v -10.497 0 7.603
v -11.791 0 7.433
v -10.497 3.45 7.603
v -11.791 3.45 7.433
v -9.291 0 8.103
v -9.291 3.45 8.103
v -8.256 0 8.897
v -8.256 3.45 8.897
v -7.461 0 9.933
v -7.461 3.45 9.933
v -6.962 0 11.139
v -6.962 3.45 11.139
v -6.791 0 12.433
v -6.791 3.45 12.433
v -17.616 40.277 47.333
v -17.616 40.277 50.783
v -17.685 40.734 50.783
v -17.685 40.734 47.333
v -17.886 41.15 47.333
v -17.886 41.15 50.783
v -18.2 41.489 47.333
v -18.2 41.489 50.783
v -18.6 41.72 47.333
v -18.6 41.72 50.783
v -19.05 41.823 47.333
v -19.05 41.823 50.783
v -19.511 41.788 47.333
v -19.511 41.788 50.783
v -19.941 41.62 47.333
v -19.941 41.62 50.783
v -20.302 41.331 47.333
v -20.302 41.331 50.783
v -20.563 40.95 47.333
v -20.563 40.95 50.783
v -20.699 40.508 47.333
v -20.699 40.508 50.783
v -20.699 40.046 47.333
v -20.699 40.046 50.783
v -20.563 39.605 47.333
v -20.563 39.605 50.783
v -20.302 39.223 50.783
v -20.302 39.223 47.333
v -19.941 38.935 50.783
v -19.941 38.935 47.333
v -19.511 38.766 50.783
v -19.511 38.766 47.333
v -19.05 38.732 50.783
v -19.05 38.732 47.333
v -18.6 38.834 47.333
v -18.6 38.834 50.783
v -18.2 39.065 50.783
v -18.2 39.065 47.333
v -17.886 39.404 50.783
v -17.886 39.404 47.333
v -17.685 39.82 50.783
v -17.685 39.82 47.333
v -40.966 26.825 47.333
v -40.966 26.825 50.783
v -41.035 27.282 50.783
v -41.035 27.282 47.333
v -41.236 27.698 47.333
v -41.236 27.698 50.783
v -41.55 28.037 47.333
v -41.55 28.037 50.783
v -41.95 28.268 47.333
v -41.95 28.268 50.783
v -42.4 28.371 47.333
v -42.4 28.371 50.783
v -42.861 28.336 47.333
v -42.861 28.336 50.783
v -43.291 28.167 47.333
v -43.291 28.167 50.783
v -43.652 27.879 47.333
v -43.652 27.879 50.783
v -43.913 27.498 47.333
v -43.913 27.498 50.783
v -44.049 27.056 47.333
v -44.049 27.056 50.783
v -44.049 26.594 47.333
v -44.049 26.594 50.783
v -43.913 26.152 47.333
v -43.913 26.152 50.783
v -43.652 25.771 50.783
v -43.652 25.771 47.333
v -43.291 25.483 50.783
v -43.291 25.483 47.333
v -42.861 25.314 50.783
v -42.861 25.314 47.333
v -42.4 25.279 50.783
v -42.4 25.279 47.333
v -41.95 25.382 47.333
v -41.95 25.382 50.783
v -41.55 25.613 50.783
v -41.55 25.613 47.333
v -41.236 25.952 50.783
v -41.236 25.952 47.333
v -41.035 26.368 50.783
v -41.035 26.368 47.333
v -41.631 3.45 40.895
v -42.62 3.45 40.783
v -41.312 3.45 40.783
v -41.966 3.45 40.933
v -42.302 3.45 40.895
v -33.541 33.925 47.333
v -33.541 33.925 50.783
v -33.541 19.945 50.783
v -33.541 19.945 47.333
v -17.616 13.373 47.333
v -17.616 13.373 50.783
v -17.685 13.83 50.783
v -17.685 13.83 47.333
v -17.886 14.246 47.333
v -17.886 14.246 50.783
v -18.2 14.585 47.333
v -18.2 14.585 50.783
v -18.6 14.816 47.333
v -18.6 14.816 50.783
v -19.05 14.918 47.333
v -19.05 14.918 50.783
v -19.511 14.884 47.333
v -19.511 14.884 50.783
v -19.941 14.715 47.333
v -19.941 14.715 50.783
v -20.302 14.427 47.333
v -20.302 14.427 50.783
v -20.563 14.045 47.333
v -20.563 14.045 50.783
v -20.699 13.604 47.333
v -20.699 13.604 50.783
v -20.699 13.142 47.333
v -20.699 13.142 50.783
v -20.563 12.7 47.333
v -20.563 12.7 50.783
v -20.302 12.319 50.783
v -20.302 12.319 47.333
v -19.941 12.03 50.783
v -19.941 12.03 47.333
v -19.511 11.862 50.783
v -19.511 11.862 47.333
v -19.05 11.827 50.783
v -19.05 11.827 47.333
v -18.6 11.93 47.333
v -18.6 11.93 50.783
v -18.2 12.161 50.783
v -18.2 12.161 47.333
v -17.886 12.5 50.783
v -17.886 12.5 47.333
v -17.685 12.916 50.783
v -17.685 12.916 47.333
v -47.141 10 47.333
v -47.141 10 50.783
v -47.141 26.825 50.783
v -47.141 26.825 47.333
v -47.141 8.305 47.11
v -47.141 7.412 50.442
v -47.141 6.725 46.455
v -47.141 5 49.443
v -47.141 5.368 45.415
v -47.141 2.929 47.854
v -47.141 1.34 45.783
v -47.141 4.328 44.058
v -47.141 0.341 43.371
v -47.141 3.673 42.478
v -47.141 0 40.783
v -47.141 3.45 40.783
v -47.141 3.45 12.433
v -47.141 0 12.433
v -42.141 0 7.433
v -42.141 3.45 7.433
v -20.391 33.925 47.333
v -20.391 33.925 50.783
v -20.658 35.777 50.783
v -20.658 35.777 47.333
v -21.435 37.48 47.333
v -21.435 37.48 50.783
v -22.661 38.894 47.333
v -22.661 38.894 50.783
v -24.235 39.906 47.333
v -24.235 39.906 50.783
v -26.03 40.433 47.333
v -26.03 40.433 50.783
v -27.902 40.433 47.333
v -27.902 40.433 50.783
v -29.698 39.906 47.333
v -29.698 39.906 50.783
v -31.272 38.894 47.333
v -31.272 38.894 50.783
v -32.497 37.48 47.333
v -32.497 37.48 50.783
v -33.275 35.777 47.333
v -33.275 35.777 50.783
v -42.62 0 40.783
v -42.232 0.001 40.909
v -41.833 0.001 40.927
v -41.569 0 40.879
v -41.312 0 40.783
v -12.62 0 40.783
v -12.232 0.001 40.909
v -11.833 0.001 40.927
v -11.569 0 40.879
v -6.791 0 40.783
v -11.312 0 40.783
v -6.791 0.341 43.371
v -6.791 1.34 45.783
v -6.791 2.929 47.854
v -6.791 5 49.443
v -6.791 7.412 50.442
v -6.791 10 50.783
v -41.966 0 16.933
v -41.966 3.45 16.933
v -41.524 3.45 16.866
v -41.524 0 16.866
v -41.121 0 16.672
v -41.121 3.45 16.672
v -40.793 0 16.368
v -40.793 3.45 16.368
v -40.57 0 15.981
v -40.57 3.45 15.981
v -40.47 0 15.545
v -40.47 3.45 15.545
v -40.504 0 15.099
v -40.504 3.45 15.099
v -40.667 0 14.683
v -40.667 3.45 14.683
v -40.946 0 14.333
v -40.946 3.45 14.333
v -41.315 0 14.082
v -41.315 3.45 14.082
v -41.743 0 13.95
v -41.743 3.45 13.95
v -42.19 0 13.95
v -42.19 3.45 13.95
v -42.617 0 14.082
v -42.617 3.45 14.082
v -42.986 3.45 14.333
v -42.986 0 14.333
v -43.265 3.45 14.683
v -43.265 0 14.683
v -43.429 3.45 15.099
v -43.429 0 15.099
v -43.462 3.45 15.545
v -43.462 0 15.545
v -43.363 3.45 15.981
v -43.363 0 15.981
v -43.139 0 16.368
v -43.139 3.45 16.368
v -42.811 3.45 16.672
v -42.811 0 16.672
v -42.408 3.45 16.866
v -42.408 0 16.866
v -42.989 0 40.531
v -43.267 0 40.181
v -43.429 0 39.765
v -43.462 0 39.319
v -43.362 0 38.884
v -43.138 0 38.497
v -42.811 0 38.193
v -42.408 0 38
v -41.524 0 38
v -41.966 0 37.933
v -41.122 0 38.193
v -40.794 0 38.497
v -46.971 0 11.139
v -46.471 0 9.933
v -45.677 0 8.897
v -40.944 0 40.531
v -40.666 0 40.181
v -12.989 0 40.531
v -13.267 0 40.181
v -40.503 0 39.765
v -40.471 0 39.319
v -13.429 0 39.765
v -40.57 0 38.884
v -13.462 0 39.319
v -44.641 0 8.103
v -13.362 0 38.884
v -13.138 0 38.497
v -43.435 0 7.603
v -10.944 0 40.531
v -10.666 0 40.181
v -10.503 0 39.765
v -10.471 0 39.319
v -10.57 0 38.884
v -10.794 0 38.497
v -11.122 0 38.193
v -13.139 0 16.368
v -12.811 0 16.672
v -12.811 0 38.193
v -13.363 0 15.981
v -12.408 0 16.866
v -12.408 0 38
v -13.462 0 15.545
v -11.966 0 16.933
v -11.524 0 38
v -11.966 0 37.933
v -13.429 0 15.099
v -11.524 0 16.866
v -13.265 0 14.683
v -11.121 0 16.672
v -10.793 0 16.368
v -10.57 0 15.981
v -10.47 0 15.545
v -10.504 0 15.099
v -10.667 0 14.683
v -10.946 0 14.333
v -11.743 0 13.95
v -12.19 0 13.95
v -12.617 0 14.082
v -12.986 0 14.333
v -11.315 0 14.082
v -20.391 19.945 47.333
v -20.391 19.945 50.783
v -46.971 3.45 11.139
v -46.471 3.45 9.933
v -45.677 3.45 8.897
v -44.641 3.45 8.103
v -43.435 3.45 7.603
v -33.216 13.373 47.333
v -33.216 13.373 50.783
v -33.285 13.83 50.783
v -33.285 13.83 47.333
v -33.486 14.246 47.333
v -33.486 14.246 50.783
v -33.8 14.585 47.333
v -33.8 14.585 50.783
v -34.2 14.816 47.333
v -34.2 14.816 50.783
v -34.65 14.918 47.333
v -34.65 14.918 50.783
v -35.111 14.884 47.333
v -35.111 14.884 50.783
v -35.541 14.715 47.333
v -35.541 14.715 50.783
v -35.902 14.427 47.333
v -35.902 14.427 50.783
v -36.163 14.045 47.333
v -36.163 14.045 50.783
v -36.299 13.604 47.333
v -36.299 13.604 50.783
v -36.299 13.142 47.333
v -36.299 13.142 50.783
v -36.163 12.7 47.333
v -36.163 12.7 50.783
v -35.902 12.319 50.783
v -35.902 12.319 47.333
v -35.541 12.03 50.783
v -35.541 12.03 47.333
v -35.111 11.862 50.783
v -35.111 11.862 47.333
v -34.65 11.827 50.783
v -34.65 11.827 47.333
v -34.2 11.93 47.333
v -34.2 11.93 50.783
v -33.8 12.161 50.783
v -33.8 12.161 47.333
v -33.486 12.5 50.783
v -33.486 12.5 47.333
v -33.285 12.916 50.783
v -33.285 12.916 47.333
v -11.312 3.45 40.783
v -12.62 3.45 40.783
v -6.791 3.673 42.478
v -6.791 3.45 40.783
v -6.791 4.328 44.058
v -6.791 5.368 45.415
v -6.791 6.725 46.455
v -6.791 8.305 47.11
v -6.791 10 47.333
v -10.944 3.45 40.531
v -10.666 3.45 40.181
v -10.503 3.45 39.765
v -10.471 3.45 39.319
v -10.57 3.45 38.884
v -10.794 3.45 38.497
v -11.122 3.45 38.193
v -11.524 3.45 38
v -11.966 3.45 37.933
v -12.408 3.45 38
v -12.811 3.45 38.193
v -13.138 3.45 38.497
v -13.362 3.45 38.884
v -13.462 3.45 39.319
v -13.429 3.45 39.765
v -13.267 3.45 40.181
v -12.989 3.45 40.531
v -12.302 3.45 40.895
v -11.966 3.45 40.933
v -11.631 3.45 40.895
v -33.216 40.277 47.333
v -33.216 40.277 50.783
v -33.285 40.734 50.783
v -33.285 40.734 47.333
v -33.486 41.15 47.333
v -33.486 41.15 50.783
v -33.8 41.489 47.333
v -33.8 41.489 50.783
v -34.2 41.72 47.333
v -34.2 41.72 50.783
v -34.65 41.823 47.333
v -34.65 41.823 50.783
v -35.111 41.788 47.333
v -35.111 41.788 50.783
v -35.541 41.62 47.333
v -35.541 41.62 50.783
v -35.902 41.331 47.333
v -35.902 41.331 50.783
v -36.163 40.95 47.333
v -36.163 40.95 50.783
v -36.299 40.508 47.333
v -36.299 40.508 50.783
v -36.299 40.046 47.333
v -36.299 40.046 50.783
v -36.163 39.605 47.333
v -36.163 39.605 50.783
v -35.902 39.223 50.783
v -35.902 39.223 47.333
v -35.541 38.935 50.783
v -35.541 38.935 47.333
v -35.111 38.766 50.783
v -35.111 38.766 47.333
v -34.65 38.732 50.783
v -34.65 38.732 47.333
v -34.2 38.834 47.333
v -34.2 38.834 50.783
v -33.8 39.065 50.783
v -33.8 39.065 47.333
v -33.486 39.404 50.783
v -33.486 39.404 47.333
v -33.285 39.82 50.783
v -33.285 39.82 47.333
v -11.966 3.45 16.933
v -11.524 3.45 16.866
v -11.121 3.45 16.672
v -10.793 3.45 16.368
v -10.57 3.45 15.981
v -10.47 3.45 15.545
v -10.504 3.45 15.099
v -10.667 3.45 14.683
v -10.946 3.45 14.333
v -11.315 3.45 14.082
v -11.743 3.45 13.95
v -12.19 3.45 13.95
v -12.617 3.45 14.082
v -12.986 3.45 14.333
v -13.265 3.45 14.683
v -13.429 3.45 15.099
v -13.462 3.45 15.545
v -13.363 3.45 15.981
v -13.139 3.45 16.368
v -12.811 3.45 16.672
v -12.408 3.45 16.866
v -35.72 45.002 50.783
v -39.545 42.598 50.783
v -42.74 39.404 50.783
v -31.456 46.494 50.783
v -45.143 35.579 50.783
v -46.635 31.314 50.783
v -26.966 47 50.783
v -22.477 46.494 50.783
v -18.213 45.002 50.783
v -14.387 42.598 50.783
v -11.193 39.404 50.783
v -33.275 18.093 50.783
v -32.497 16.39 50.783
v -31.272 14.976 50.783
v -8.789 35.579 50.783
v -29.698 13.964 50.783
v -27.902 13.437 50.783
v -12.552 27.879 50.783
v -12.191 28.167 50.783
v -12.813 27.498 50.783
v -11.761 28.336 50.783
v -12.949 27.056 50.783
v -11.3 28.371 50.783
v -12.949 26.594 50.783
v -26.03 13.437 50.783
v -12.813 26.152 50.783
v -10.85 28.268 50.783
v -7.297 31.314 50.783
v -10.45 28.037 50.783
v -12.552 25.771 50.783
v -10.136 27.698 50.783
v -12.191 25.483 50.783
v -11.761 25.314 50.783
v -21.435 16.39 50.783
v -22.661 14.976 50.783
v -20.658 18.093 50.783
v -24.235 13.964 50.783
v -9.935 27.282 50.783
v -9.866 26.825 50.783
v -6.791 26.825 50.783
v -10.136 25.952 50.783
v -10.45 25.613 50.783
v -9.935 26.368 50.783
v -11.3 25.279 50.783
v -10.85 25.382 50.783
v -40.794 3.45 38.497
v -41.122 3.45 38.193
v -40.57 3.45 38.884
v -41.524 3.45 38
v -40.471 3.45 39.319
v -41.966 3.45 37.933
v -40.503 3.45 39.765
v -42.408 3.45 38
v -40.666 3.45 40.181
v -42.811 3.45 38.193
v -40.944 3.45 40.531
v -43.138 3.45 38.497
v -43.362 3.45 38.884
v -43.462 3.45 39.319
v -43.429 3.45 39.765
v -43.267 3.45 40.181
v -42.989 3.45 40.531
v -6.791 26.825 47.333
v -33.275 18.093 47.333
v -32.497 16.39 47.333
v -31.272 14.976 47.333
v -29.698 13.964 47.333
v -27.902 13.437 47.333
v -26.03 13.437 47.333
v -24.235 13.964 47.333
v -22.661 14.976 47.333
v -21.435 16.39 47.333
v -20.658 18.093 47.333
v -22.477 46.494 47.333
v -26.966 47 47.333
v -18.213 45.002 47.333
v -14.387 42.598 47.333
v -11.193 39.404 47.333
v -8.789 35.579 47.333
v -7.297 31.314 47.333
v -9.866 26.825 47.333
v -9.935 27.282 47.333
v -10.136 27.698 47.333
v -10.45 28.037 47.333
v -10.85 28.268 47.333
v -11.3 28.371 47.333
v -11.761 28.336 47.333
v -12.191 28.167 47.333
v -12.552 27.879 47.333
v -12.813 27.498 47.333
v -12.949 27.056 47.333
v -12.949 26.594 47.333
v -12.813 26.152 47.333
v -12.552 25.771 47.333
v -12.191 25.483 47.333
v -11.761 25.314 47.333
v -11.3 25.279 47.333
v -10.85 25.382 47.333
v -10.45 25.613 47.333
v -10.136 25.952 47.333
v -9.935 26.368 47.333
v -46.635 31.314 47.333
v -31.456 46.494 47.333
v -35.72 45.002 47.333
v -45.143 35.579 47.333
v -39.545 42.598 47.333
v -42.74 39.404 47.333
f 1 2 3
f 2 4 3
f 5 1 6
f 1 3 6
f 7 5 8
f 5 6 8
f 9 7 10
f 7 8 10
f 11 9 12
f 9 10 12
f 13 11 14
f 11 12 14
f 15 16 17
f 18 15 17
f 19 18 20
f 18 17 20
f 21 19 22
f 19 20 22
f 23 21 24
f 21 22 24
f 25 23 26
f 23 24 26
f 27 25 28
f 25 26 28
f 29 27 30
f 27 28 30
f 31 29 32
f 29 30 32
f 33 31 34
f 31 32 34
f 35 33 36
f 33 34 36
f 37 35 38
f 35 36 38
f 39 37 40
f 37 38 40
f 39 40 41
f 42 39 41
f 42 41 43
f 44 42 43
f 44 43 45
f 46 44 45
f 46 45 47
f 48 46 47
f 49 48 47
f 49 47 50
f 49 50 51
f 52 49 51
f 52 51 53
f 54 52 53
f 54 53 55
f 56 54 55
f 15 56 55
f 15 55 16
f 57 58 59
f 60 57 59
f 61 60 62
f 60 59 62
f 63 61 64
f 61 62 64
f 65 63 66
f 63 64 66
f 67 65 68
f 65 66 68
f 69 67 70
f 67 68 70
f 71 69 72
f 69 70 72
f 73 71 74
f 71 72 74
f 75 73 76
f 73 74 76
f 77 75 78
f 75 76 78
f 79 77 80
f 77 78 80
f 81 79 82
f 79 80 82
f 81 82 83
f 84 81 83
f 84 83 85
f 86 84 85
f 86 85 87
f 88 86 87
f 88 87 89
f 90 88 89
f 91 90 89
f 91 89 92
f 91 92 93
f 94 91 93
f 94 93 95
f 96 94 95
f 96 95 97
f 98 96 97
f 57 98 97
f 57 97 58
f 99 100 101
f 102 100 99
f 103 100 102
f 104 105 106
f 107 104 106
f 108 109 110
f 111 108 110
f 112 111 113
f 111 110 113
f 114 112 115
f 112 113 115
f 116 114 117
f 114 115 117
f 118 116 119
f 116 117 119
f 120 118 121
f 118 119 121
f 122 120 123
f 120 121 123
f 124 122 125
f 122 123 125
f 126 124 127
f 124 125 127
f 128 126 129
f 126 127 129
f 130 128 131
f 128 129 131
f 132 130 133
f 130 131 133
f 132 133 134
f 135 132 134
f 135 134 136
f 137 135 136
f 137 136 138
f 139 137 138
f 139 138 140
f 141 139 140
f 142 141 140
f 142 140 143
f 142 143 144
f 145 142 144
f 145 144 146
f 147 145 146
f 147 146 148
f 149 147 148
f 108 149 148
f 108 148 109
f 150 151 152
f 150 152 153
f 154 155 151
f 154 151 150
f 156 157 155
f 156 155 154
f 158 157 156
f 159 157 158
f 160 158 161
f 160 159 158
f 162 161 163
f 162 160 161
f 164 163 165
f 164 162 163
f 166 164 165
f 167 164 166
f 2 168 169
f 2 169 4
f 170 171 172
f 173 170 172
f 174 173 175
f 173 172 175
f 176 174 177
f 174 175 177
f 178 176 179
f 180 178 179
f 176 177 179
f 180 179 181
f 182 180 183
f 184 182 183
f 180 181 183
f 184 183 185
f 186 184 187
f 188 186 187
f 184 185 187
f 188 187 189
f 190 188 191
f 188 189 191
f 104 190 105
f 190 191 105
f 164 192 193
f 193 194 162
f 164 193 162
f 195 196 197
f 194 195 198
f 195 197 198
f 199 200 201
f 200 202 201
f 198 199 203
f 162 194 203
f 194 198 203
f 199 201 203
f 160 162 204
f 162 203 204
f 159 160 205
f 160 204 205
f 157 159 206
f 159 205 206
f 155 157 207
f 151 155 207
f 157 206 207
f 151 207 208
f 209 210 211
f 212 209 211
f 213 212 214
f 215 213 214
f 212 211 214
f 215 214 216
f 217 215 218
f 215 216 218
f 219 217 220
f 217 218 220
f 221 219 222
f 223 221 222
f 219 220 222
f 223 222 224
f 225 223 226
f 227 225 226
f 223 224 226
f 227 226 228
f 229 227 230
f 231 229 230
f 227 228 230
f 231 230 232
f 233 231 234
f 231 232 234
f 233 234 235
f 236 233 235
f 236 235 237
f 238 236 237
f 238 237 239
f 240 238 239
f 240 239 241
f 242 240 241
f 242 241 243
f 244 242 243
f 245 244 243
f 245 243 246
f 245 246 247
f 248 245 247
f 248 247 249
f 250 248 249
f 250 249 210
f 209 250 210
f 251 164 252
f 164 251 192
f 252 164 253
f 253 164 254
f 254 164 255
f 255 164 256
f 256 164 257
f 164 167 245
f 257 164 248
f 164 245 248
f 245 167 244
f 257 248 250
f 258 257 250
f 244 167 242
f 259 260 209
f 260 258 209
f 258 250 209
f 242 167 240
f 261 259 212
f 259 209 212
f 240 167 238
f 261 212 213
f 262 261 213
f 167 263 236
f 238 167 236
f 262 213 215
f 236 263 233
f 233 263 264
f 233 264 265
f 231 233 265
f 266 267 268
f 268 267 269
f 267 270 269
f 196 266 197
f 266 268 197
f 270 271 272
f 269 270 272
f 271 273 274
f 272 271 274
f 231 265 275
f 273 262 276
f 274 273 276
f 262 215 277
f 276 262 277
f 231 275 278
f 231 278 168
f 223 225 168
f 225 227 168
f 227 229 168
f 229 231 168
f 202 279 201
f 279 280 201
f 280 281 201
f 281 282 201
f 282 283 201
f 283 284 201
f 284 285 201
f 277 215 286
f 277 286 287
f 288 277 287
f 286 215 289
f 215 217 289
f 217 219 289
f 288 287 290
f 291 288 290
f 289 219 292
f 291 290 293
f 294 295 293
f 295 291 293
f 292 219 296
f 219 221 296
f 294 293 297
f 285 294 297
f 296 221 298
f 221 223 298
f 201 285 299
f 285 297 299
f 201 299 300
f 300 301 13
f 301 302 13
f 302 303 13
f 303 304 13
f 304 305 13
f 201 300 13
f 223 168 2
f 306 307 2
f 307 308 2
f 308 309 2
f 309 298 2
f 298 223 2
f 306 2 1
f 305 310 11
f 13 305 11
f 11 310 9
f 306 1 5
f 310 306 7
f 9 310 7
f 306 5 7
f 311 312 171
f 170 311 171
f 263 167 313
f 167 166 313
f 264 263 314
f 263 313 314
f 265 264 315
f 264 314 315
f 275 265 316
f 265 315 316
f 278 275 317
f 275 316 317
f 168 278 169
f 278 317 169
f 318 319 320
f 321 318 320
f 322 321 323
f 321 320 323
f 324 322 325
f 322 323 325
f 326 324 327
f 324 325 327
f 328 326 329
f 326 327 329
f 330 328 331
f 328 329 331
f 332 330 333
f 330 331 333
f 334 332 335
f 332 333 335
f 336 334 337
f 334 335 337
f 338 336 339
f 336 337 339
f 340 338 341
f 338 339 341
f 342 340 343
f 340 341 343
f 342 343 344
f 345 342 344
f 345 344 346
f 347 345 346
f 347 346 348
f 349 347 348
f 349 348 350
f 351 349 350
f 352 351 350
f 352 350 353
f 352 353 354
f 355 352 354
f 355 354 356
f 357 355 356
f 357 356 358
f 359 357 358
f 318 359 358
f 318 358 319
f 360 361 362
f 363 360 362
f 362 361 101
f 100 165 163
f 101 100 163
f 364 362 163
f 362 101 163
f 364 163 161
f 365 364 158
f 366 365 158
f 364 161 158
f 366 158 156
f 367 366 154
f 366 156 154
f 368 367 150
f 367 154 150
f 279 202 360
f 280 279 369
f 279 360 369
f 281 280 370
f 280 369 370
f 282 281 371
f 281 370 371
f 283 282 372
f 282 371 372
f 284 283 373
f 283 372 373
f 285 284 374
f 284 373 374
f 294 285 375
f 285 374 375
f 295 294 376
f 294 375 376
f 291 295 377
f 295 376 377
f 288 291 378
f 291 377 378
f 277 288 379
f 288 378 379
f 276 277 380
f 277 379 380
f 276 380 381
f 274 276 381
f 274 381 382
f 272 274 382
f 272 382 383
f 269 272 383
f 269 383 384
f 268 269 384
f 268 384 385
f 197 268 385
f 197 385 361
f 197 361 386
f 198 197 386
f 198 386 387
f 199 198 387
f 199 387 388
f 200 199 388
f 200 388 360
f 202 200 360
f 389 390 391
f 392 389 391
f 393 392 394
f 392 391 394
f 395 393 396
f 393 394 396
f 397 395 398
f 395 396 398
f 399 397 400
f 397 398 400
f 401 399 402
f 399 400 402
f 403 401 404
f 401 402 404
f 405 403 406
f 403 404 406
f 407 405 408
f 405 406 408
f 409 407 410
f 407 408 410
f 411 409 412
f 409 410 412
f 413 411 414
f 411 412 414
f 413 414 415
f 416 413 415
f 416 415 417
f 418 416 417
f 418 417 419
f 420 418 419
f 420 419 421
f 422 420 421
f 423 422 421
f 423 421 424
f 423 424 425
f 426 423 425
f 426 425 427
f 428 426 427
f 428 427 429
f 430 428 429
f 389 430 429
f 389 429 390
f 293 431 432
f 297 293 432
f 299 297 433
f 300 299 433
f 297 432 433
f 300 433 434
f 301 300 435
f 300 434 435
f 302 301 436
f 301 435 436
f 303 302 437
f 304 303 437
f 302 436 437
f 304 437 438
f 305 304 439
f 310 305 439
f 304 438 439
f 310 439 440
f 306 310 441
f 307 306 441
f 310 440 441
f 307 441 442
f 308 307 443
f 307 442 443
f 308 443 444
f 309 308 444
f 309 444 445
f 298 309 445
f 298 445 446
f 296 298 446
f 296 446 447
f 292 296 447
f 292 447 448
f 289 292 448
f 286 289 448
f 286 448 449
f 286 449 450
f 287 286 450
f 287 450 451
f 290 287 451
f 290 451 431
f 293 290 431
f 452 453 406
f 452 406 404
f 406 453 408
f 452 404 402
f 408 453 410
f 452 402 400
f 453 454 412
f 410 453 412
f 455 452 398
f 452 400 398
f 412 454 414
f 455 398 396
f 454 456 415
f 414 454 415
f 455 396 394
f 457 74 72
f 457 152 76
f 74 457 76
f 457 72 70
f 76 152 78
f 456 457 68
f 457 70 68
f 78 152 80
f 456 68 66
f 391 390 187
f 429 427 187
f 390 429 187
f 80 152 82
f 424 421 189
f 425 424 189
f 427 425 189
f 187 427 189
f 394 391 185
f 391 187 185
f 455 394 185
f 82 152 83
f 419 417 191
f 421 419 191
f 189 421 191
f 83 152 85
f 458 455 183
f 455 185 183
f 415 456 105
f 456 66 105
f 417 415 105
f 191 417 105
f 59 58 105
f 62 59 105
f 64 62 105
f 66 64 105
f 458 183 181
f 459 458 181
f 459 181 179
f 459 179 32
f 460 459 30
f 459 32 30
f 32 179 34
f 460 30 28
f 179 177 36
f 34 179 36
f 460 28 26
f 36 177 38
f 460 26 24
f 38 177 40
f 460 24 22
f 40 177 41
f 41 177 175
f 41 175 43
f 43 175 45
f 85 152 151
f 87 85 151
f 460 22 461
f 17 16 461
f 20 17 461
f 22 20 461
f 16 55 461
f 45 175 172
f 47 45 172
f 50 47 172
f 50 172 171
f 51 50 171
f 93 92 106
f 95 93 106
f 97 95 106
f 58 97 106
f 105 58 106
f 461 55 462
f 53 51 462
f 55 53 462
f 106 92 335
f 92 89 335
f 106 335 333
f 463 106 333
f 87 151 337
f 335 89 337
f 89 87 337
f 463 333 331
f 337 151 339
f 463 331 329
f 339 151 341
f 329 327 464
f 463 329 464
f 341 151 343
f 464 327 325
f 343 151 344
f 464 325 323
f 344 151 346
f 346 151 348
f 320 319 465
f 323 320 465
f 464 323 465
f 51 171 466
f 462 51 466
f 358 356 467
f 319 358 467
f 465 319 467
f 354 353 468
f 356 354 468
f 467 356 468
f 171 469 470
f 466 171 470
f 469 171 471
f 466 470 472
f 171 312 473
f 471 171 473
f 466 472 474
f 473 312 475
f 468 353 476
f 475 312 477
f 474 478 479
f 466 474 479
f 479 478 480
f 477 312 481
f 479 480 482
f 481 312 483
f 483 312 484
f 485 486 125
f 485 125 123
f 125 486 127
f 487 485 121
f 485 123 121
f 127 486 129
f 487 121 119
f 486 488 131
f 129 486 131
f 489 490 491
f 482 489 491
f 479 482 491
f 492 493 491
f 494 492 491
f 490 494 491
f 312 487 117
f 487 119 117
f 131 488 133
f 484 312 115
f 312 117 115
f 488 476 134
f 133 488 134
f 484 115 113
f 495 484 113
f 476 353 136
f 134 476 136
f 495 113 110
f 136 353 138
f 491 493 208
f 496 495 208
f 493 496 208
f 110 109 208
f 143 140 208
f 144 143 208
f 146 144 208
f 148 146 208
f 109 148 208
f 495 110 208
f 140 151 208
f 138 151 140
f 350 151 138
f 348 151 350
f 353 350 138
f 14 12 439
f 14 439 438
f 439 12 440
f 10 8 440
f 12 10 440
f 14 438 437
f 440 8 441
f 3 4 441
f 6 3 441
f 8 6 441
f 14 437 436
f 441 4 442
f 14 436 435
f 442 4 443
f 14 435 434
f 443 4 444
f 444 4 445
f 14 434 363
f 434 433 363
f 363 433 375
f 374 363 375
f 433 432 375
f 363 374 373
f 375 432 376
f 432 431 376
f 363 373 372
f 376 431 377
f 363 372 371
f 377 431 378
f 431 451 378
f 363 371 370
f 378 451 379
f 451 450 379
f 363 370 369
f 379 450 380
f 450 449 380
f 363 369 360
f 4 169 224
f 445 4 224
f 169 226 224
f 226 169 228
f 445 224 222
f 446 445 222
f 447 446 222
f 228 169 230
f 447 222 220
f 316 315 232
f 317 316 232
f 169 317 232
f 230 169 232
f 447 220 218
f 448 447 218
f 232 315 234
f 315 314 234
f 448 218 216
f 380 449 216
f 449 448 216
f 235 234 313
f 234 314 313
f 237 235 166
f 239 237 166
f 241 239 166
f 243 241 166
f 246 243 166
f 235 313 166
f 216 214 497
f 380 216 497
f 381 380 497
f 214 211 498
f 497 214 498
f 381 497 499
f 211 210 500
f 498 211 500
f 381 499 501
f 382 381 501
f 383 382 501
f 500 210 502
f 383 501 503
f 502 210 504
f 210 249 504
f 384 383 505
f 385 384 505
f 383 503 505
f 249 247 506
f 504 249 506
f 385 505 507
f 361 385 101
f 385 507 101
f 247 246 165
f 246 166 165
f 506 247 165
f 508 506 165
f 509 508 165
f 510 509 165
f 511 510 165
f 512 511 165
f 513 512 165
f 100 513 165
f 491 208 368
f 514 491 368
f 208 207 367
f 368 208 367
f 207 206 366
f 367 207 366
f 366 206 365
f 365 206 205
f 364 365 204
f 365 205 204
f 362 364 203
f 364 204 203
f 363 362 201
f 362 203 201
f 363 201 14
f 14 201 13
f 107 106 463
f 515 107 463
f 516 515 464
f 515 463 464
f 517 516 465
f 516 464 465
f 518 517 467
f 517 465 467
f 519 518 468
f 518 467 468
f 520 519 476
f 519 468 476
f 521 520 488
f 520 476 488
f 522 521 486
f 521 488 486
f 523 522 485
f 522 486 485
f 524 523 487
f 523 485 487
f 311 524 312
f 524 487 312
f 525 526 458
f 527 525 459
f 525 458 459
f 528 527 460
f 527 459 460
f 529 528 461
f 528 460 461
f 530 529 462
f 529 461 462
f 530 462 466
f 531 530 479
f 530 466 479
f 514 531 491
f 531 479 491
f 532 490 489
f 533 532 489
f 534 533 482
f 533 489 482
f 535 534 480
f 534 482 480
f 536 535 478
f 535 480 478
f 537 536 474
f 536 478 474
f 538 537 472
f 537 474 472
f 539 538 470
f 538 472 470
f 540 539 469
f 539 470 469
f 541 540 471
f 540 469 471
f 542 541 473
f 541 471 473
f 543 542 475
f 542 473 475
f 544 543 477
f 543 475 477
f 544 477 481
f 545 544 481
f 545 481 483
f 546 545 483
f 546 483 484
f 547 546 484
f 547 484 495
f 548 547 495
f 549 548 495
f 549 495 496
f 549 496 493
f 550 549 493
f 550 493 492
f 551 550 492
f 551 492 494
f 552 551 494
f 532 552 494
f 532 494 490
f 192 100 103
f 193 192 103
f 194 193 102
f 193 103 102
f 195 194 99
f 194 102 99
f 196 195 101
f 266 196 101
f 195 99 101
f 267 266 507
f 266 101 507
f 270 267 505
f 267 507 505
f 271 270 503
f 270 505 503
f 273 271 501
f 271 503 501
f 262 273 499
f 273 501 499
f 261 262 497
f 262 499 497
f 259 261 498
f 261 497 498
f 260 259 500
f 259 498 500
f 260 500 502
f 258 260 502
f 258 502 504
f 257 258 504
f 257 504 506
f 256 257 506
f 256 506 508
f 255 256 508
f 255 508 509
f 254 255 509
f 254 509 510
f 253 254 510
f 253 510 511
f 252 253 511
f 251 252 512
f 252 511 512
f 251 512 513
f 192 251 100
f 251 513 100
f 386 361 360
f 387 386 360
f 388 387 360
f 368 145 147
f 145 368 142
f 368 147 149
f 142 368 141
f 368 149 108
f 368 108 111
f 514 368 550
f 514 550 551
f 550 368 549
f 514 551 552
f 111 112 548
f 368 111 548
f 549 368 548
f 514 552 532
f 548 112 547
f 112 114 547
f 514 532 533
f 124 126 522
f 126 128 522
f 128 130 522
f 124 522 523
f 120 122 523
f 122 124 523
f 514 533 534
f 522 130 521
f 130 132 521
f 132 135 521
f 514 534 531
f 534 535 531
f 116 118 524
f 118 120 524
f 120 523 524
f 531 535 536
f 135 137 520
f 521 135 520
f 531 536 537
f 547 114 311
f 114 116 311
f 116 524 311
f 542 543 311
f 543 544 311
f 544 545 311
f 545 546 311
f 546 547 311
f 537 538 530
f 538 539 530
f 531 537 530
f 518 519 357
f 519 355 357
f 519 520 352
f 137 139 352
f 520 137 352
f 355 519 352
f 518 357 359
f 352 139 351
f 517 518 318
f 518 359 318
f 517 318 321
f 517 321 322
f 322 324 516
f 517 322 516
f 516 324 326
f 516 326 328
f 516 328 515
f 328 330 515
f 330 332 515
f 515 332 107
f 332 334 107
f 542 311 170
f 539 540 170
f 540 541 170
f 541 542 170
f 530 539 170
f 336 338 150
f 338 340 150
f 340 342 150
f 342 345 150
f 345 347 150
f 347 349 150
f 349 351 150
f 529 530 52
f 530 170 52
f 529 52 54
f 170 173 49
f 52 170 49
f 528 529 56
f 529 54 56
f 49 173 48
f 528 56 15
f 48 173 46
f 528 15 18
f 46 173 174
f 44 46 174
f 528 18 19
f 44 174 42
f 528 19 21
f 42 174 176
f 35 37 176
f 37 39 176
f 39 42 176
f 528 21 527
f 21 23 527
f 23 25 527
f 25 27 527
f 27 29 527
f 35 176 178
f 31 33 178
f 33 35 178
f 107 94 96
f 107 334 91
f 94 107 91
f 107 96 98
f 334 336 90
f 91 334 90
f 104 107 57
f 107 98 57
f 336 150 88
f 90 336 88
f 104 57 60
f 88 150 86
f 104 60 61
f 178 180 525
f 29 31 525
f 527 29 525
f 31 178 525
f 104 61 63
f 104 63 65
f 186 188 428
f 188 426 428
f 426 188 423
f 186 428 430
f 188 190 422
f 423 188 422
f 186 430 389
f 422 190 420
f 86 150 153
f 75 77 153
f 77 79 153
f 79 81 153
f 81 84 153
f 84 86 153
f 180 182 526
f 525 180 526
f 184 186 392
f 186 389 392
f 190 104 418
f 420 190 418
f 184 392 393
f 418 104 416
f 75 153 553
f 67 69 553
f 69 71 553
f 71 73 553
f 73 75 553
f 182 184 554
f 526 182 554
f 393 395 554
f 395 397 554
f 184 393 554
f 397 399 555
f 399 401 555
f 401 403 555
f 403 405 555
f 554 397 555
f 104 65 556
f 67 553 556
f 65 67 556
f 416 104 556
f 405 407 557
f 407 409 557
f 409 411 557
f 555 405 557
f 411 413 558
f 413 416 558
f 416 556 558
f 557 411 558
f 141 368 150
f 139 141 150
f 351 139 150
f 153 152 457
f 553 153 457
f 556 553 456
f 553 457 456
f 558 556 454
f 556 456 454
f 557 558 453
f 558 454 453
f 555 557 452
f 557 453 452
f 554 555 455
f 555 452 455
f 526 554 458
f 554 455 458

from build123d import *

# Parameters (mm, degrees)
SKETCH1_W           = 40.35
SKETCH1_H           = 43.35
BOSS_EXTRUDE1_DEPTH = 47
CUT_EXTRUDE2_DEPTH  = 102
FILLET1_R           = 10
CUT_EXTRUDE3_DEPTH  = 102
FILLET2_R           = 5
CUT_EXTRUDE5_DEPTH  = 102
SKETCH8_R           = 1.55
CUT_EXTRUDE6_DEPTH  = 102
SKETCH6_R           = 1.5
CUT_EXTRUDE7_DEPTH  = 82.840160626


with BuildPart() as part:
    # Sketch1 → Boss-Extrude1 (new body)
    with BuildSketch(Plane(origin=(0, 0, 0), x_dir=(1, 0, 0), z_dir=(0, 1, 0))):
        with Locations((-26.966212793, -29.108023223)):
            Rectangle(SKETCH1_W, SKETCH1_H)
    extrude(amount=BOSS_EXTRUDE1_DEPTH)

    # Sketch3 → Cut-Extrude2 (cut)
    with BuildSketch(Plane.XY.offset(50.783023223)):
        with BuildLine():
            Line((-47.141212793, 47), (-47.141212793, 26.825))
            ThreePointArc((-47.141212793, 26.825), (-41.232092103, 41.09087931), (-26.966212793, 47))
            Line((-26.966212793, 47), (-47.141212793, 47))
        make_face()
        with BuildLine():
            Line((-6.791212793, 47), (-26.966212793, 47))
            ThreePointArc((-26.966212793, 47), (-12.700333482, 41.09087931), (-6.791212793, 26.825))
            Line((-6.791212793, 26.825), (-6.791212793, 47))
        make_face()
    extrude(amount=-CUT_EXTRUDE2_DEPTH, mode=Mode.SUBTRACT)

    # Fillet1
    fillet1_edges = [part.edges().sort_by_distance(p)[0] for p in [
        (-26.966212793, 0, 50.783023223),
    ]]
    fillet(fillet1_edges, radius=FILLET1_R)

    # Sketch5 → Cut-Extrude3 (cut)
    with BuildSketch(Plane.ZY.offset(47.141212793)):
        with BuildLine():
            Line((-6.665763497, 3.45), (36.595559978, 3.45))
            Line((36.595559978, 3.45), (40.783023223, 3.45))
            ThreePointArc((40.783023223, 3.45), (45.41457264, 5.368450583), (47.333023223, 10))
            Line((47.333023223, 10), (47.333023223, 17.578484004))
            Line((47.333023223, 17.578484004), (47.333023223, 59.778436909))
            Line((47.333023223, 59.778436909), (-6.665763497, 59.778436909))
            Line((-6.665763497, 59.778436909), (-6.665763497, 3.45))
        make_face()
    extrude(amount=-CUT_EXTRUDE3_DEPTH, mode=Mode.SUBTRACT)

    # Fillet2
    fillet2_edges = [part.edges().sort_by_distance(p)[0] for p in [
        (-6.791212793, 1.725, 7.433023223),
        (-47.141212793, 1.725, 7.433023223),
    ]]
    fillet(fillet2_edges, radius=FILLET2_R)

    # Sketch7 → Cut-Extrude5 (cut)
    with BuildSketch(Plane.XY.offset(50.783023223)):
        with BuildLine():
            Line((-33.541212793, 33.925), (-33.541212793, 19.945))
            ThreePointArc((-33.541212793, 19.945), (-26.966212793, 13.37), (-20.391212793, 19.945))
            Line((-20.391212793, 19.945), (-20.391212793, 33.925))
            ThreePointArc((-20.391212793, 33.925), (-26.966212793, 40.5), (-33.541212793, 33.925))
        make_face()
    extrude(amount=-CUT_EXTRUDE5_DEPTH, mode=Mode.SUBTRACT)

    # Sketch8 → Cut-Extrude6 (cut)
    with BuildSketch(Plane.XY.offset(50.783023223)):
        with Locations((-34.766212793, 13.372769702)):
            Circle(SKETCH8_R)
        with Locations((-19.166212793, 13.372769702)):
            Circle(SKETCH8_R)
        with BuildLine():
            ThreePointArc((-12.966212793, 26.825), (-11.416212793, 25.275), (-9.866212793, 26.825))
            Line((-9.866212793, 26.825), (-12.966212793, 26.825))
        make_face()
        with BuildLine():
            Line((-12.966212793, 26.825), (-9.866212793, 26.825))
            ThreePointArc((-9.866212793, 26.825), (-11.416212793, 28.375), (-12.966212793, 26.825))
        make_face()
        with BuildLine():
            ThreePointArc((-44.066212793, 26.825), (-42.516212793, 25.275), (-40.966212793, 26.825))
            Line((-40.966212793, 26.825), (-44.066212793, 26.825))
        make_face()
        with BuildLine():
            Line((-44.066212793, 26.825), (-40.966212793, 26.825))
            ThreePointArc((-40.966212793, 26.825), (-42.516212793, 28.375), (-44.066212793, 26.825))
        make_face()
        with Locations((-34.766212793, 40.277230298)):
            Circle(SKETCH8_R)
        with Locations((-19.166212793, 40.277230298)):
            Circle(SKETCH8_R)
    extrude(amount=-CUT_EXTRUDE6_DEPTH, mode=Mode.SUBTRACT)

    # Sketch6 → Cut-Extrude7 (cut, through all)
    with BuildSketch(Plane(origin=(0, 3.45, 0), x_dir=(1, 0, 0), z_dir=(0, 1, 0))):
        with Locations(Location((-41.966212793, -15.433023223, 0), (0, 0, 270))):
            Circle(SKETCH6_R)
        with Locations(Location((-11.966212793, -15.433023223, 0), (0, 0, 270))):
            Circle(SKETCH6_R)
        with Locations(Location((-41.966212793, -39.433023223, 0), (0, 0, 244.158067237))):
            Circle(SKETCH6_R)
        with Locations(Location((-11.966212793, -39.433023223, 0), (0, 0, 295.841932763))):
            Circle(SKETCH6_R)
    extrude(amount=-CUT_EXTRUDE7_DEPTH, mode=Mode.SUBTRACT)


solid = part.part
